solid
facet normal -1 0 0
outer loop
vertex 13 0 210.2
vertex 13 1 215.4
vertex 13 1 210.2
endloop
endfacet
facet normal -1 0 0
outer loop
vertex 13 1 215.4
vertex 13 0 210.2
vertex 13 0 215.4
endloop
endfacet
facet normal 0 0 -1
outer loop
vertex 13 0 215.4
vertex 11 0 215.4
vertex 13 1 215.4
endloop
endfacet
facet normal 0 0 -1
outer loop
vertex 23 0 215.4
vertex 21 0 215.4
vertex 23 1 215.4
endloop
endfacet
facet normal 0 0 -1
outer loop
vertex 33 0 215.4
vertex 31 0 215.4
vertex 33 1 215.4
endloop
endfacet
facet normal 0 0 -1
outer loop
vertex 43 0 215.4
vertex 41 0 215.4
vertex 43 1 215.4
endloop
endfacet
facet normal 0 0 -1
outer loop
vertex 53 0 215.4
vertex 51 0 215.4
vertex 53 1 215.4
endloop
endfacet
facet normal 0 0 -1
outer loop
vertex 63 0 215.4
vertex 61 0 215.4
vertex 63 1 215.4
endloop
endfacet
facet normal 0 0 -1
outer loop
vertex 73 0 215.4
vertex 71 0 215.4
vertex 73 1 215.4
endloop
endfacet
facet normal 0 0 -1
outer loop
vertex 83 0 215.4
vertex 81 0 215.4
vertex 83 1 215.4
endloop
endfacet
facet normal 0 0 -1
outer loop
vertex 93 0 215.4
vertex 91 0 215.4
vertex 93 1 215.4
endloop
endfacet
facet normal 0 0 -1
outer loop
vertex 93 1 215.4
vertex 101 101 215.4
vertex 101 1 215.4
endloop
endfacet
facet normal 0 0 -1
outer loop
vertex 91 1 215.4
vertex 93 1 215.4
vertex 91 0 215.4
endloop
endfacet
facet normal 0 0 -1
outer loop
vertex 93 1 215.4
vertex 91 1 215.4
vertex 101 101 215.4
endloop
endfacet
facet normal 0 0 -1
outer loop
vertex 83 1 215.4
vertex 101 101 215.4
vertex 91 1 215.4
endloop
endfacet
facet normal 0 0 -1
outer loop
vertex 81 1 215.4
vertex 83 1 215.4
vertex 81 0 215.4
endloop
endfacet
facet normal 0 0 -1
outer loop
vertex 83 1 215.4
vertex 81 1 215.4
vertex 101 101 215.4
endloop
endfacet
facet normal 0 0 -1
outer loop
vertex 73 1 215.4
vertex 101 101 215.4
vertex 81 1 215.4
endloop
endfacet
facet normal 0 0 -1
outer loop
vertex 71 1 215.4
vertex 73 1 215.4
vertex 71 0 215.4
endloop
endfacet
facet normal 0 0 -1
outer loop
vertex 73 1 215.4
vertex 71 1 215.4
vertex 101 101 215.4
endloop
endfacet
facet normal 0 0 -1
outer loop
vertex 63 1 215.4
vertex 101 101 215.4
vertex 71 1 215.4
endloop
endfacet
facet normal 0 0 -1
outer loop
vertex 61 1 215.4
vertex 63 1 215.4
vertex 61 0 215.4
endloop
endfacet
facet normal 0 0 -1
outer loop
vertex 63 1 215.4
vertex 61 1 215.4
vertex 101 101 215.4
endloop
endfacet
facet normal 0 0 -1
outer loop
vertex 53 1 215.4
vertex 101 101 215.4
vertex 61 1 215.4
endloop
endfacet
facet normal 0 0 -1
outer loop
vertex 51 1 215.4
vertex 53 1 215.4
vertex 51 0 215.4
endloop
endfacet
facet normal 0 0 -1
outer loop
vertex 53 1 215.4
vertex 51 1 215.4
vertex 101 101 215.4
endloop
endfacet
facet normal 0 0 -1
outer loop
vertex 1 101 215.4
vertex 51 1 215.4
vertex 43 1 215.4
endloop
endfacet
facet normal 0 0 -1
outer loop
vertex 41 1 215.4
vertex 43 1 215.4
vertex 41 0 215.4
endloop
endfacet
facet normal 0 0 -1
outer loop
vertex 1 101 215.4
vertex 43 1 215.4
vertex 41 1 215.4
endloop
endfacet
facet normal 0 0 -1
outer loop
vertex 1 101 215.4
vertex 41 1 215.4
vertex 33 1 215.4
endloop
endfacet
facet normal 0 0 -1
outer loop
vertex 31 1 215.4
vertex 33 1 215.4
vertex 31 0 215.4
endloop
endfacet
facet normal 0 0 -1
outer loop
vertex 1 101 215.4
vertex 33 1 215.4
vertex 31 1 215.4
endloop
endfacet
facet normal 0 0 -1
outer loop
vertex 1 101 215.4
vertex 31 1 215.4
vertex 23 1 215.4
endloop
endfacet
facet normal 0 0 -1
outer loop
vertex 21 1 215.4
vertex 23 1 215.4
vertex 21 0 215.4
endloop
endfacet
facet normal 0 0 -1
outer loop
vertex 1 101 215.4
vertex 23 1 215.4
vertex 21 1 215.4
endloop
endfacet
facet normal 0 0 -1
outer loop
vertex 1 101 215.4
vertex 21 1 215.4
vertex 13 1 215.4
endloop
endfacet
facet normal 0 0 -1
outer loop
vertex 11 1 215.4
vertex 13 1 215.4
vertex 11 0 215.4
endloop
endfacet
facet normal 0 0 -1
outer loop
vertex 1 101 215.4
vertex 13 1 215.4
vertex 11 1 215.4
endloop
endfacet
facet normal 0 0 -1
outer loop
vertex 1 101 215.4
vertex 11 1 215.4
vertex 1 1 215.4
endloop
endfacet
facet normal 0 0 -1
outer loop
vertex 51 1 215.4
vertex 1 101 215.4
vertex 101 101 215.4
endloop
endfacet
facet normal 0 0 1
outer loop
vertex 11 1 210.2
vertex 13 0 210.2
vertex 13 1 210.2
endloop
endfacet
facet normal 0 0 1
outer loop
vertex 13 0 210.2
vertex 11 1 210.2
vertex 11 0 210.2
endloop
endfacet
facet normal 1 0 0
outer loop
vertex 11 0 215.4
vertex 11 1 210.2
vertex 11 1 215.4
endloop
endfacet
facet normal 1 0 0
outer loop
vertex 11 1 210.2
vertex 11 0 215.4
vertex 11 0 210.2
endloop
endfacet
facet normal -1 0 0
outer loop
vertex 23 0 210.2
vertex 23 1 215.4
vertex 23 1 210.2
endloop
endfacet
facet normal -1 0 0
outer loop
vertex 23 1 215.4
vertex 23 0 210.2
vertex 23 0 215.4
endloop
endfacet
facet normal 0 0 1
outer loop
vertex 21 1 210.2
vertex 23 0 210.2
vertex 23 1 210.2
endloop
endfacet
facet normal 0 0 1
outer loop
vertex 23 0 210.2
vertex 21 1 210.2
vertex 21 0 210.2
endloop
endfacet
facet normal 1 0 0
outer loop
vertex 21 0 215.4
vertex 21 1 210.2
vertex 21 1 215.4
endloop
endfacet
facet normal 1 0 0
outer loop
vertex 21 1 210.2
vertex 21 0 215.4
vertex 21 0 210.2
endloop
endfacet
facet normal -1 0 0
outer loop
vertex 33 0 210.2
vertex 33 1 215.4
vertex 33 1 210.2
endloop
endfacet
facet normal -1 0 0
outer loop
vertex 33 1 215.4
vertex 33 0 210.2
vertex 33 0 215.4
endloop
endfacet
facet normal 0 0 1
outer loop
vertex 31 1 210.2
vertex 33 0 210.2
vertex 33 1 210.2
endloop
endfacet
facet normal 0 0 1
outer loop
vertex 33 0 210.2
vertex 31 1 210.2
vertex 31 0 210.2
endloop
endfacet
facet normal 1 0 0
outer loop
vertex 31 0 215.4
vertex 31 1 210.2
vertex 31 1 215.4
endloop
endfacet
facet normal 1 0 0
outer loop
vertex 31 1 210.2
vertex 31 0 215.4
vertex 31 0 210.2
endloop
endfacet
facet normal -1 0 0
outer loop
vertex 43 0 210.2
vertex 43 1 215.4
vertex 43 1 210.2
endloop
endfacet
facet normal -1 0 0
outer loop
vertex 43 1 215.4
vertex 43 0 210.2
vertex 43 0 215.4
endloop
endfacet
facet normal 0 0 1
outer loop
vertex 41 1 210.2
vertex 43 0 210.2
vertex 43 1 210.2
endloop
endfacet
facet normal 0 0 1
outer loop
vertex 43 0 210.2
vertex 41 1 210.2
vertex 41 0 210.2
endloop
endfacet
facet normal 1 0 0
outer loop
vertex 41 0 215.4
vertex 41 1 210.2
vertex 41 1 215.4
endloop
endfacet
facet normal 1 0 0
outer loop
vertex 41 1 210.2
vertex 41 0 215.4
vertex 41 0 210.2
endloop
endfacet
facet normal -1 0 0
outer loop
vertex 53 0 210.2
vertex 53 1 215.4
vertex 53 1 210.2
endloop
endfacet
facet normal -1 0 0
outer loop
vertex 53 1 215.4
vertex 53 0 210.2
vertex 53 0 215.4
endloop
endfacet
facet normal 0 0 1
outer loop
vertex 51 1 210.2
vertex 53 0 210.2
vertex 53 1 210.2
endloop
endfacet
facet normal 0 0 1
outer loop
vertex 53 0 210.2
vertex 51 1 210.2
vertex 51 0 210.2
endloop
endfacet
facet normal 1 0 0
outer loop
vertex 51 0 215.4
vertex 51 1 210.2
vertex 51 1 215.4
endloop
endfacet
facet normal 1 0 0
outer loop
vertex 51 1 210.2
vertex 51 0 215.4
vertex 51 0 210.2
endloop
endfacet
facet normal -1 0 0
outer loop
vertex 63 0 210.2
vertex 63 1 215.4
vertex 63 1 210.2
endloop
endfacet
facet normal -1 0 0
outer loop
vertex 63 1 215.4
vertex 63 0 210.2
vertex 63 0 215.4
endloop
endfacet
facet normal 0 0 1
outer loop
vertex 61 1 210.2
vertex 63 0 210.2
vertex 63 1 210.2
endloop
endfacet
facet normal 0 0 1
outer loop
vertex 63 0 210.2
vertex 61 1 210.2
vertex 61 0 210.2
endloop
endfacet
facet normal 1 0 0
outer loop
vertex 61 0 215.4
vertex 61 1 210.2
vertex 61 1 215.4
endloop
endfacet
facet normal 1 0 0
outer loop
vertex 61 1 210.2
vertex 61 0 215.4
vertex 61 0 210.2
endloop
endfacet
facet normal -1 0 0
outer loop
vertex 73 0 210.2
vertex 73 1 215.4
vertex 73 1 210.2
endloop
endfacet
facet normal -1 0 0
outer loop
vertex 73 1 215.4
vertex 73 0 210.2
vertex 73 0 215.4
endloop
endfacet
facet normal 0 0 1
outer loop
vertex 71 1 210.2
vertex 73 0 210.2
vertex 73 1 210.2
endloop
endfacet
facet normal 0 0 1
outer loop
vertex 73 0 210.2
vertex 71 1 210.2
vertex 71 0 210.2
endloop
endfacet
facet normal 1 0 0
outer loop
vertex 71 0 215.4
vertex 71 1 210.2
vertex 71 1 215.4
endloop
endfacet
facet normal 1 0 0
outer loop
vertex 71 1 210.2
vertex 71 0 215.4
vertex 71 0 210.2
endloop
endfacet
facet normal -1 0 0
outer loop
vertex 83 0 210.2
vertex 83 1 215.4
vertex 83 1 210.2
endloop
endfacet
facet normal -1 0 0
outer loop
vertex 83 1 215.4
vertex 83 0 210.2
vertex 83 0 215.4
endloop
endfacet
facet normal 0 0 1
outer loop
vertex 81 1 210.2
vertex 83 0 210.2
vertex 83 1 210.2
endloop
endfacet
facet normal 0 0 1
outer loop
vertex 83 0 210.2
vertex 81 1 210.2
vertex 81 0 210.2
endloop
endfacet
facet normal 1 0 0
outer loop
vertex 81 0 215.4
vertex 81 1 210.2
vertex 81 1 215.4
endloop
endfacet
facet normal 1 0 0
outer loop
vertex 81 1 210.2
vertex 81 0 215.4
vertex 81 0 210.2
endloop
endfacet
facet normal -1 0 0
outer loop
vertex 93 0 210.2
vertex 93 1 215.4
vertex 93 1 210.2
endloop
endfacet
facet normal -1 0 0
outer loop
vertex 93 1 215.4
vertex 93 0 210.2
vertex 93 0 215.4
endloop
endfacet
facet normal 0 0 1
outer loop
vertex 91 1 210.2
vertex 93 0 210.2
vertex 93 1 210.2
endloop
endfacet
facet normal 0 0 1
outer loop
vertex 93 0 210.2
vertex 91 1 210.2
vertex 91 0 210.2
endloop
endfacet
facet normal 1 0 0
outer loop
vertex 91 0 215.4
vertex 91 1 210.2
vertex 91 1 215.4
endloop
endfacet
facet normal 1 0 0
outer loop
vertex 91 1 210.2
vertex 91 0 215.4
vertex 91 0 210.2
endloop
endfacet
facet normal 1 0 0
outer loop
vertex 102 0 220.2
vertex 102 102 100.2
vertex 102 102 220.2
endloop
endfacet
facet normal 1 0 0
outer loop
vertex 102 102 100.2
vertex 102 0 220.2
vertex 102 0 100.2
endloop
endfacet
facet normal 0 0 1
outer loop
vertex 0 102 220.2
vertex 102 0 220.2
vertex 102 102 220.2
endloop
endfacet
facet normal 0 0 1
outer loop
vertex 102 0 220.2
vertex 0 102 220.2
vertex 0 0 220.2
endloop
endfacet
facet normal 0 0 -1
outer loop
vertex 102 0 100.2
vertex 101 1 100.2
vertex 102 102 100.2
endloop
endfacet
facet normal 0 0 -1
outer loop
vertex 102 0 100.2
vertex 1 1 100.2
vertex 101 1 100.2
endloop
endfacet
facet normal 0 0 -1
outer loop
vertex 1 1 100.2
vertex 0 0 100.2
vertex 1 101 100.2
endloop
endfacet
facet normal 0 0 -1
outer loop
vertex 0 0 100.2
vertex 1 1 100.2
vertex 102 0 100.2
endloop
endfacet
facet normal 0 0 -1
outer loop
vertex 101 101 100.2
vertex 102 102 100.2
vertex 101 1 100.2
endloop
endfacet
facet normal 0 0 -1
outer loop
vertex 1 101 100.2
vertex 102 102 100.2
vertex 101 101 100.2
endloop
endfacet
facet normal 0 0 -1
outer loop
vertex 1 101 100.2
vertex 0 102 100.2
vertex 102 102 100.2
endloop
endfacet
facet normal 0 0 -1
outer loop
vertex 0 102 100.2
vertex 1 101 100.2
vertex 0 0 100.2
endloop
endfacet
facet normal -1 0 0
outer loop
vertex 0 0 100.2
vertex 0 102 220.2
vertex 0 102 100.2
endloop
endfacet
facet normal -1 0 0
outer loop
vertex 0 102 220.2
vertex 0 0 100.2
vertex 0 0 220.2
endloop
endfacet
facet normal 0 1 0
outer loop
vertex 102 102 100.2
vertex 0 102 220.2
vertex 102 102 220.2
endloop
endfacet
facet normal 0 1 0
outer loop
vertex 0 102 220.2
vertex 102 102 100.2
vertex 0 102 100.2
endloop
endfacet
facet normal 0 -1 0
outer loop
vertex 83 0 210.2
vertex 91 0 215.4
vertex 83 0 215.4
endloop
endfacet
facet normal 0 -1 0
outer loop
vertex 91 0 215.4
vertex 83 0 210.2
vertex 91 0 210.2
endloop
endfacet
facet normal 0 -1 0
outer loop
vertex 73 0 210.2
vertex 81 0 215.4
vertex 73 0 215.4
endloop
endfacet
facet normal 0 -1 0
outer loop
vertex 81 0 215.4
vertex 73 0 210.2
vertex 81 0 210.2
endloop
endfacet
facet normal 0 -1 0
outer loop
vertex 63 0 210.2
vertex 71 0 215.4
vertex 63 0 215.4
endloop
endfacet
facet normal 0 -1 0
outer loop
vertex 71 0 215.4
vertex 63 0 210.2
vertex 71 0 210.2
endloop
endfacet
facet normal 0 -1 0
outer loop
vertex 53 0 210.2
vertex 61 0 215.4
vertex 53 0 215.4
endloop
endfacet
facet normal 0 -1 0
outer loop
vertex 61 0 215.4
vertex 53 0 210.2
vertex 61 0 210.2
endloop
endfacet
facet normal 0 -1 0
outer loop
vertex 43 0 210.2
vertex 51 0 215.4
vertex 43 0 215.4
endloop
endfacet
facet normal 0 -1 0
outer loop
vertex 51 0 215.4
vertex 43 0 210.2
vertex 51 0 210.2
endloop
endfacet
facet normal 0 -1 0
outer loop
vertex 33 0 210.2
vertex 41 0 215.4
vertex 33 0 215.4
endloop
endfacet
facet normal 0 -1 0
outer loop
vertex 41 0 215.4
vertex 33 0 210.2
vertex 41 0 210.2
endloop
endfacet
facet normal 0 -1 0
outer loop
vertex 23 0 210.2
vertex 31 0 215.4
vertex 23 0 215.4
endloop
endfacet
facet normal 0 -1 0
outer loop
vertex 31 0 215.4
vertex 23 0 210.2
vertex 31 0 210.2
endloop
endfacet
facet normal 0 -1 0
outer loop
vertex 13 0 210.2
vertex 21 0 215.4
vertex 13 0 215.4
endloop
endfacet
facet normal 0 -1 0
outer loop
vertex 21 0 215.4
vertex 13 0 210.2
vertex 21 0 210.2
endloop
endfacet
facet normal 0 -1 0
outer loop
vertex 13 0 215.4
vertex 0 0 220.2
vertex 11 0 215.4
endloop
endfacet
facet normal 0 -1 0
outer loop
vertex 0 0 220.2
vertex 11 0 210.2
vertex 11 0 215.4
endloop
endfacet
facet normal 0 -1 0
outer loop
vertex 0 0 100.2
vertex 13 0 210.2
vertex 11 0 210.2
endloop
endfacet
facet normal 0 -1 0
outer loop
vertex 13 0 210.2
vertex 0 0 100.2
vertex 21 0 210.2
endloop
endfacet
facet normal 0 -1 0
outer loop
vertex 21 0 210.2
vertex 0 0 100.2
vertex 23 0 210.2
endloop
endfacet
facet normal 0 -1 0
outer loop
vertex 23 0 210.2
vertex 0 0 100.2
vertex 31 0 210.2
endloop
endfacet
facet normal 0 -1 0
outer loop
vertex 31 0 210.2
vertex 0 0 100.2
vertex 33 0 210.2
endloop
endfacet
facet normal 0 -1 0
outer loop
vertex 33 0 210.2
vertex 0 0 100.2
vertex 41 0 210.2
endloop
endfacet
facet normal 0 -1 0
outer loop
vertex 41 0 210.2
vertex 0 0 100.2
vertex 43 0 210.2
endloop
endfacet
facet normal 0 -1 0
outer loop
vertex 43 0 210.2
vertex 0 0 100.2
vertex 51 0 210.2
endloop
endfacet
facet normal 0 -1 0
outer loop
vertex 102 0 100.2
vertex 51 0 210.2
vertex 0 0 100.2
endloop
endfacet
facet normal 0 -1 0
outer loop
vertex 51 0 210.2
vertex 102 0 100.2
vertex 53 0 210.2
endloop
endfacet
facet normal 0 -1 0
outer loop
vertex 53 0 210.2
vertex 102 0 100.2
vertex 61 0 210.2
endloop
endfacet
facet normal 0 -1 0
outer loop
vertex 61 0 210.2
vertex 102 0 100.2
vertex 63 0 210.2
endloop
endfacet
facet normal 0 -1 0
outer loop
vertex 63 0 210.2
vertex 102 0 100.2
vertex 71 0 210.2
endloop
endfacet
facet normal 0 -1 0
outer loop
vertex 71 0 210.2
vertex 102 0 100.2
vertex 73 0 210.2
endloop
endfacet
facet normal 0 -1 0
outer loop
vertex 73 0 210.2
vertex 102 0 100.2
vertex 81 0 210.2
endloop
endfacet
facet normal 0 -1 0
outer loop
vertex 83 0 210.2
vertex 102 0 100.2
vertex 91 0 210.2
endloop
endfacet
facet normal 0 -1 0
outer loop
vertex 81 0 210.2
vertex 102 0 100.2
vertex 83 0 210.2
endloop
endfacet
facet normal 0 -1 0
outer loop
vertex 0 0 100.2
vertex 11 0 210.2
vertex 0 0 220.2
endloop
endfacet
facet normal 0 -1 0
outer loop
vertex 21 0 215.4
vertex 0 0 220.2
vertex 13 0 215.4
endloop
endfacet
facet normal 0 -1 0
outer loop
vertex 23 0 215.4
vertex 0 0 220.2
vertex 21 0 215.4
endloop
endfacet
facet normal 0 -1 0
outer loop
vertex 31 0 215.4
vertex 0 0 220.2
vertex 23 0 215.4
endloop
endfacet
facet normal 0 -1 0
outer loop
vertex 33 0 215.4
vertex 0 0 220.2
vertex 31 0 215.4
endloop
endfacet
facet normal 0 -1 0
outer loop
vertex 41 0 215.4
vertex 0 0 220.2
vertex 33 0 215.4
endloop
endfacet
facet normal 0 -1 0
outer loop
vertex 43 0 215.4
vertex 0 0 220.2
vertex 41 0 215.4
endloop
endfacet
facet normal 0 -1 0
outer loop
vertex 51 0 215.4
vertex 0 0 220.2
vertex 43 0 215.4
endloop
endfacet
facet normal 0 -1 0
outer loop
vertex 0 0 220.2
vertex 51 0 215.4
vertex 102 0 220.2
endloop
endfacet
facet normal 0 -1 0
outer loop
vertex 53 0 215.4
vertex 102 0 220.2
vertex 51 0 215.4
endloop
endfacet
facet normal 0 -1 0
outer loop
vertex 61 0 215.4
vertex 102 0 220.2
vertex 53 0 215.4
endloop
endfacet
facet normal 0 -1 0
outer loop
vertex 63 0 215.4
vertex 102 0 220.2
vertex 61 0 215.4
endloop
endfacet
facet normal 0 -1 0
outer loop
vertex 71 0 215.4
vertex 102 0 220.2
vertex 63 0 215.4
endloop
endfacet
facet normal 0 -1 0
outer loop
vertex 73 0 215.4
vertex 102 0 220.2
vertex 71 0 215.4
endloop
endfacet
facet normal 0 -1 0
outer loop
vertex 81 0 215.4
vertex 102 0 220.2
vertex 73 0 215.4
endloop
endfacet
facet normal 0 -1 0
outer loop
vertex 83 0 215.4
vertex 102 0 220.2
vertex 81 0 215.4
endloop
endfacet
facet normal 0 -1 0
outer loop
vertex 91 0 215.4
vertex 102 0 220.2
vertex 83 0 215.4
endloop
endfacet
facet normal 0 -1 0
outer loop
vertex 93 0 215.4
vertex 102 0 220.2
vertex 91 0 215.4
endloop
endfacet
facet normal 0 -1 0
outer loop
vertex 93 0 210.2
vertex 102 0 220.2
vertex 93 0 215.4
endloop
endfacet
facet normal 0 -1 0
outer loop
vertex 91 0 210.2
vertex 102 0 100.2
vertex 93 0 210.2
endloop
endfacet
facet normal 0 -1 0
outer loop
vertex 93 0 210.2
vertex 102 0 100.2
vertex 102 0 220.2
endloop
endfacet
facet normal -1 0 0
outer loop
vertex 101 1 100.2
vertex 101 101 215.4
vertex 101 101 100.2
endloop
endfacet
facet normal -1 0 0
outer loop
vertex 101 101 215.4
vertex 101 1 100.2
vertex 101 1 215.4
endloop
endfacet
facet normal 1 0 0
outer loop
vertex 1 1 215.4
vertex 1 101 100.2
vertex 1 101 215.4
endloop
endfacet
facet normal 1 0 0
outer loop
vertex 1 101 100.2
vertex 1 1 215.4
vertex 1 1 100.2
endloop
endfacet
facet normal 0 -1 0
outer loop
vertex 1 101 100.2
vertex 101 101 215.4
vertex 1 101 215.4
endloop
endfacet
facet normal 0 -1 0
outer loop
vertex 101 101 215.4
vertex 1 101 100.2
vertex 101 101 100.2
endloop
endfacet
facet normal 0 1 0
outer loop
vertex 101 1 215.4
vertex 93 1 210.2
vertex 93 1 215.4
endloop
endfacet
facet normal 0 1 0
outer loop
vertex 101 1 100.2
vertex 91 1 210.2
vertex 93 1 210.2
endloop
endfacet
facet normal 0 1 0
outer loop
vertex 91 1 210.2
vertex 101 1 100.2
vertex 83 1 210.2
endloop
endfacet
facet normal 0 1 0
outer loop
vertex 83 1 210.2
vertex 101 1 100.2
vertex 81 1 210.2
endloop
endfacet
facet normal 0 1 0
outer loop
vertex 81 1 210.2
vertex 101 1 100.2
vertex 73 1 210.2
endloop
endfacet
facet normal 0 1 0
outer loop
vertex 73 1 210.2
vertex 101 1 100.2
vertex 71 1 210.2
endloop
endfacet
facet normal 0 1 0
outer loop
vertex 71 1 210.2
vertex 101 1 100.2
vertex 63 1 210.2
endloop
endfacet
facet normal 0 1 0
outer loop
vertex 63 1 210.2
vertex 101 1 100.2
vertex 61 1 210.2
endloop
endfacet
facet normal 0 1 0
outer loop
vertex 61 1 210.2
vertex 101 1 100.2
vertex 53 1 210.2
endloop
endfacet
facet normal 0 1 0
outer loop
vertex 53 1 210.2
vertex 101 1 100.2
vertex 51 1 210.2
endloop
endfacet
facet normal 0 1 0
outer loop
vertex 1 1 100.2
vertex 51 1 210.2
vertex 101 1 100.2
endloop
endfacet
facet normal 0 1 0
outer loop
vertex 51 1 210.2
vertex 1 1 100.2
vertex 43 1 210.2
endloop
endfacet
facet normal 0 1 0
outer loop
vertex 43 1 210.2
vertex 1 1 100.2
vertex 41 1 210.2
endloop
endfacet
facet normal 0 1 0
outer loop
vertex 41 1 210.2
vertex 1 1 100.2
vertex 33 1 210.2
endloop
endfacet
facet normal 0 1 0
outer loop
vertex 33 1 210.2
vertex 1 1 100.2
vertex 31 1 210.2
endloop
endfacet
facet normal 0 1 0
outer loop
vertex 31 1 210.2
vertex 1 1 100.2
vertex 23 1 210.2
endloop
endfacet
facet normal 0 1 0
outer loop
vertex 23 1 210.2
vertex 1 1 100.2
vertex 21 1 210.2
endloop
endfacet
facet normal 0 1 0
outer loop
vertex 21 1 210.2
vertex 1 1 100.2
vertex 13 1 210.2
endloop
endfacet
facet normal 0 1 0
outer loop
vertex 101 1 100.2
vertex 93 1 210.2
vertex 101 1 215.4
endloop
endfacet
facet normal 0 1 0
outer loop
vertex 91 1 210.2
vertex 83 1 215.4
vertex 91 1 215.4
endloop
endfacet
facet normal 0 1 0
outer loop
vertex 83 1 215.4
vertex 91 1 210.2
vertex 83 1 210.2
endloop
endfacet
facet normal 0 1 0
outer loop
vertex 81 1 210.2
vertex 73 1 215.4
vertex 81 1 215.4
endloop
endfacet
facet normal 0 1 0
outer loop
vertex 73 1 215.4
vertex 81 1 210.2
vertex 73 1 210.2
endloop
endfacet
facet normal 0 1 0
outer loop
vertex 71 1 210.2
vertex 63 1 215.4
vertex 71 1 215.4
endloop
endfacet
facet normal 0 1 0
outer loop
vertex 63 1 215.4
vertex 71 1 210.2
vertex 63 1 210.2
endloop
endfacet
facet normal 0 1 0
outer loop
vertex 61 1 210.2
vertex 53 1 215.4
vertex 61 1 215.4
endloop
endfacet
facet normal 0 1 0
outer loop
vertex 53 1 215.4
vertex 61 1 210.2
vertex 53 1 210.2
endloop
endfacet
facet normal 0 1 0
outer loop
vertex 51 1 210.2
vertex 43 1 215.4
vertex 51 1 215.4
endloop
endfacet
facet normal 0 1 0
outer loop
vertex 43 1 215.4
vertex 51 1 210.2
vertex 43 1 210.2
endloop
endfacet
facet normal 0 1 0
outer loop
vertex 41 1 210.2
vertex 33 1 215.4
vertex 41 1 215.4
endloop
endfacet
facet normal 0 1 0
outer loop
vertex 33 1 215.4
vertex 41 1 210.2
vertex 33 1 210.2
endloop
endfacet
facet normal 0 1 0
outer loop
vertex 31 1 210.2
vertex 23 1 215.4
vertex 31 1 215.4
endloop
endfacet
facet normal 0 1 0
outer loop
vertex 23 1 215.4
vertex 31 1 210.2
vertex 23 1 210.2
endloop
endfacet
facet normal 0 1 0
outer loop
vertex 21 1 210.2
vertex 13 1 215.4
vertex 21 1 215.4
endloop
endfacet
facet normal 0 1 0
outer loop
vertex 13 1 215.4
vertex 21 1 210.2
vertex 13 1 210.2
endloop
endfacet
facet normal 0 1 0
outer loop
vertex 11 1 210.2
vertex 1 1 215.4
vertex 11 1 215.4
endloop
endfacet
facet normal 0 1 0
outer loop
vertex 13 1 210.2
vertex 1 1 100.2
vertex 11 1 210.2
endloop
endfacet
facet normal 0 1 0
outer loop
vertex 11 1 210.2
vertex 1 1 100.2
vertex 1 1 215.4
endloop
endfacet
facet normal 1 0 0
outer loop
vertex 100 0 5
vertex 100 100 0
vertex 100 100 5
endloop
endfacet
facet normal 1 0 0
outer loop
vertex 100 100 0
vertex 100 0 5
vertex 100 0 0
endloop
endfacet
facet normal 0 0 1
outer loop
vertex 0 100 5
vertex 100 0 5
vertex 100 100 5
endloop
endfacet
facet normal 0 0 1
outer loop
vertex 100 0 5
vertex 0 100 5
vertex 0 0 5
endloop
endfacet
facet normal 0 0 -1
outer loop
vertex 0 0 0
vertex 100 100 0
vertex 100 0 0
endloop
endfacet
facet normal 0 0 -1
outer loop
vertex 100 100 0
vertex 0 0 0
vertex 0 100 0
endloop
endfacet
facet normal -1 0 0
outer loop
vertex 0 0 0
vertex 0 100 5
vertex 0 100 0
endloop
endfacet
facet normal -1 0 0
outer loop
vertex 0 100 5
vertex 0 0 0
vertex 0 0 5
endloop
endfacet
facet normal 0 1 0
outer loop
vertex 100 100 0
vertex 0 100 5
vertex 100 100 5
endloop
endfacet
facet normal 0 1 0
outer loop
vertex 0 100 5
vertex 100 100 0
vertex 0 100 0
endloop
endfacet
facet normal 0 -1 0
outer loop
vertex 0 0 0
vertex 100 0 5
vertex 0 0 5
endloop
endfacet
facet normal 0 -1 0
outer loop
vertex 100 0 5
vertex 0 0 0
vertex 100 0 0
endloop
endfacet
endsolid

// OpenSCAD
// Parameters
$fn=50; // Smooth curves
box_width = 100; // Width of the box
box_depth = 100; // Depth of the box
box_height = 120; // Height of the box
wall_thickness = 5; // Thickness of the walls
lift_height = 100; // Starting lift height of the cover above the base
overlap = 1; // How much the cover overlaps the bottom platform
vent_slit_width = 2; // Width of ventilation slits
vent_slit_height = 5; // Height of ventilation slits
vent_slit_spacing = 10; // Spacing between ventilation slits
vent_slit_offset = 5; // Offset from the top of the box for the ventilation slits
clearance = 0.2; // Increased clearance to avoid rendering glitches

// Free-floating bottom
module bottom() {
    // No need to translate down as we will ensure the cover does not touch the base
    cube([box_width, box_depth, wall_thickness]);
}

// Ventilation slits near the top of the sides
module ventilation_slits() {
    for(x = [overlap + vent_slit_spacing : vent_slit_spacing : box_width + overlap - vent_slit_spacing]) {
        translate([x, -clearance, box_height - vent_slit_offset - vent_slit_height]) {
            cube([vent_slit_width, wall_thickness + 2 * clearance, vent_slit_height + clearance]);
        }
        translate([x, box_depth + wall_thickness - clearance, box_height - vent_slit_offset - vent_slit_height]) {
            cube([vent_slit_width, wall_thickness + 2 * clearance, vent_slit_height + clearance]);
        }
    }
}

// Cover with side ventilation slits
module cover() {
    // Calculate the translation height based on the animation time $t
    // The cover starts fully lifted (lift_height) and moves down, stopping just above the base
    height = lift_height * (1 - $t) + clearance; // Add clearance to prevent touching

    translate([0, 0, height]) { // Move the cover down during the animation
        difference() {
            // The outer shape of the cover
            cube([box_width + 2 * overlap, box_depth + 2 * overlap, box_height]);

            // Subtracting the inner part to create hollow space and walls, with clearance
            translate([overlap, overlap, 0])
                cube([box_width, box_depth, box_height - wall_thickness + clearance]);

            // Subtract ventilation slits from the cover sides, with clearance
            ventilation_slits();
        }
    }
}

// Assembly
bottom();
cover();
